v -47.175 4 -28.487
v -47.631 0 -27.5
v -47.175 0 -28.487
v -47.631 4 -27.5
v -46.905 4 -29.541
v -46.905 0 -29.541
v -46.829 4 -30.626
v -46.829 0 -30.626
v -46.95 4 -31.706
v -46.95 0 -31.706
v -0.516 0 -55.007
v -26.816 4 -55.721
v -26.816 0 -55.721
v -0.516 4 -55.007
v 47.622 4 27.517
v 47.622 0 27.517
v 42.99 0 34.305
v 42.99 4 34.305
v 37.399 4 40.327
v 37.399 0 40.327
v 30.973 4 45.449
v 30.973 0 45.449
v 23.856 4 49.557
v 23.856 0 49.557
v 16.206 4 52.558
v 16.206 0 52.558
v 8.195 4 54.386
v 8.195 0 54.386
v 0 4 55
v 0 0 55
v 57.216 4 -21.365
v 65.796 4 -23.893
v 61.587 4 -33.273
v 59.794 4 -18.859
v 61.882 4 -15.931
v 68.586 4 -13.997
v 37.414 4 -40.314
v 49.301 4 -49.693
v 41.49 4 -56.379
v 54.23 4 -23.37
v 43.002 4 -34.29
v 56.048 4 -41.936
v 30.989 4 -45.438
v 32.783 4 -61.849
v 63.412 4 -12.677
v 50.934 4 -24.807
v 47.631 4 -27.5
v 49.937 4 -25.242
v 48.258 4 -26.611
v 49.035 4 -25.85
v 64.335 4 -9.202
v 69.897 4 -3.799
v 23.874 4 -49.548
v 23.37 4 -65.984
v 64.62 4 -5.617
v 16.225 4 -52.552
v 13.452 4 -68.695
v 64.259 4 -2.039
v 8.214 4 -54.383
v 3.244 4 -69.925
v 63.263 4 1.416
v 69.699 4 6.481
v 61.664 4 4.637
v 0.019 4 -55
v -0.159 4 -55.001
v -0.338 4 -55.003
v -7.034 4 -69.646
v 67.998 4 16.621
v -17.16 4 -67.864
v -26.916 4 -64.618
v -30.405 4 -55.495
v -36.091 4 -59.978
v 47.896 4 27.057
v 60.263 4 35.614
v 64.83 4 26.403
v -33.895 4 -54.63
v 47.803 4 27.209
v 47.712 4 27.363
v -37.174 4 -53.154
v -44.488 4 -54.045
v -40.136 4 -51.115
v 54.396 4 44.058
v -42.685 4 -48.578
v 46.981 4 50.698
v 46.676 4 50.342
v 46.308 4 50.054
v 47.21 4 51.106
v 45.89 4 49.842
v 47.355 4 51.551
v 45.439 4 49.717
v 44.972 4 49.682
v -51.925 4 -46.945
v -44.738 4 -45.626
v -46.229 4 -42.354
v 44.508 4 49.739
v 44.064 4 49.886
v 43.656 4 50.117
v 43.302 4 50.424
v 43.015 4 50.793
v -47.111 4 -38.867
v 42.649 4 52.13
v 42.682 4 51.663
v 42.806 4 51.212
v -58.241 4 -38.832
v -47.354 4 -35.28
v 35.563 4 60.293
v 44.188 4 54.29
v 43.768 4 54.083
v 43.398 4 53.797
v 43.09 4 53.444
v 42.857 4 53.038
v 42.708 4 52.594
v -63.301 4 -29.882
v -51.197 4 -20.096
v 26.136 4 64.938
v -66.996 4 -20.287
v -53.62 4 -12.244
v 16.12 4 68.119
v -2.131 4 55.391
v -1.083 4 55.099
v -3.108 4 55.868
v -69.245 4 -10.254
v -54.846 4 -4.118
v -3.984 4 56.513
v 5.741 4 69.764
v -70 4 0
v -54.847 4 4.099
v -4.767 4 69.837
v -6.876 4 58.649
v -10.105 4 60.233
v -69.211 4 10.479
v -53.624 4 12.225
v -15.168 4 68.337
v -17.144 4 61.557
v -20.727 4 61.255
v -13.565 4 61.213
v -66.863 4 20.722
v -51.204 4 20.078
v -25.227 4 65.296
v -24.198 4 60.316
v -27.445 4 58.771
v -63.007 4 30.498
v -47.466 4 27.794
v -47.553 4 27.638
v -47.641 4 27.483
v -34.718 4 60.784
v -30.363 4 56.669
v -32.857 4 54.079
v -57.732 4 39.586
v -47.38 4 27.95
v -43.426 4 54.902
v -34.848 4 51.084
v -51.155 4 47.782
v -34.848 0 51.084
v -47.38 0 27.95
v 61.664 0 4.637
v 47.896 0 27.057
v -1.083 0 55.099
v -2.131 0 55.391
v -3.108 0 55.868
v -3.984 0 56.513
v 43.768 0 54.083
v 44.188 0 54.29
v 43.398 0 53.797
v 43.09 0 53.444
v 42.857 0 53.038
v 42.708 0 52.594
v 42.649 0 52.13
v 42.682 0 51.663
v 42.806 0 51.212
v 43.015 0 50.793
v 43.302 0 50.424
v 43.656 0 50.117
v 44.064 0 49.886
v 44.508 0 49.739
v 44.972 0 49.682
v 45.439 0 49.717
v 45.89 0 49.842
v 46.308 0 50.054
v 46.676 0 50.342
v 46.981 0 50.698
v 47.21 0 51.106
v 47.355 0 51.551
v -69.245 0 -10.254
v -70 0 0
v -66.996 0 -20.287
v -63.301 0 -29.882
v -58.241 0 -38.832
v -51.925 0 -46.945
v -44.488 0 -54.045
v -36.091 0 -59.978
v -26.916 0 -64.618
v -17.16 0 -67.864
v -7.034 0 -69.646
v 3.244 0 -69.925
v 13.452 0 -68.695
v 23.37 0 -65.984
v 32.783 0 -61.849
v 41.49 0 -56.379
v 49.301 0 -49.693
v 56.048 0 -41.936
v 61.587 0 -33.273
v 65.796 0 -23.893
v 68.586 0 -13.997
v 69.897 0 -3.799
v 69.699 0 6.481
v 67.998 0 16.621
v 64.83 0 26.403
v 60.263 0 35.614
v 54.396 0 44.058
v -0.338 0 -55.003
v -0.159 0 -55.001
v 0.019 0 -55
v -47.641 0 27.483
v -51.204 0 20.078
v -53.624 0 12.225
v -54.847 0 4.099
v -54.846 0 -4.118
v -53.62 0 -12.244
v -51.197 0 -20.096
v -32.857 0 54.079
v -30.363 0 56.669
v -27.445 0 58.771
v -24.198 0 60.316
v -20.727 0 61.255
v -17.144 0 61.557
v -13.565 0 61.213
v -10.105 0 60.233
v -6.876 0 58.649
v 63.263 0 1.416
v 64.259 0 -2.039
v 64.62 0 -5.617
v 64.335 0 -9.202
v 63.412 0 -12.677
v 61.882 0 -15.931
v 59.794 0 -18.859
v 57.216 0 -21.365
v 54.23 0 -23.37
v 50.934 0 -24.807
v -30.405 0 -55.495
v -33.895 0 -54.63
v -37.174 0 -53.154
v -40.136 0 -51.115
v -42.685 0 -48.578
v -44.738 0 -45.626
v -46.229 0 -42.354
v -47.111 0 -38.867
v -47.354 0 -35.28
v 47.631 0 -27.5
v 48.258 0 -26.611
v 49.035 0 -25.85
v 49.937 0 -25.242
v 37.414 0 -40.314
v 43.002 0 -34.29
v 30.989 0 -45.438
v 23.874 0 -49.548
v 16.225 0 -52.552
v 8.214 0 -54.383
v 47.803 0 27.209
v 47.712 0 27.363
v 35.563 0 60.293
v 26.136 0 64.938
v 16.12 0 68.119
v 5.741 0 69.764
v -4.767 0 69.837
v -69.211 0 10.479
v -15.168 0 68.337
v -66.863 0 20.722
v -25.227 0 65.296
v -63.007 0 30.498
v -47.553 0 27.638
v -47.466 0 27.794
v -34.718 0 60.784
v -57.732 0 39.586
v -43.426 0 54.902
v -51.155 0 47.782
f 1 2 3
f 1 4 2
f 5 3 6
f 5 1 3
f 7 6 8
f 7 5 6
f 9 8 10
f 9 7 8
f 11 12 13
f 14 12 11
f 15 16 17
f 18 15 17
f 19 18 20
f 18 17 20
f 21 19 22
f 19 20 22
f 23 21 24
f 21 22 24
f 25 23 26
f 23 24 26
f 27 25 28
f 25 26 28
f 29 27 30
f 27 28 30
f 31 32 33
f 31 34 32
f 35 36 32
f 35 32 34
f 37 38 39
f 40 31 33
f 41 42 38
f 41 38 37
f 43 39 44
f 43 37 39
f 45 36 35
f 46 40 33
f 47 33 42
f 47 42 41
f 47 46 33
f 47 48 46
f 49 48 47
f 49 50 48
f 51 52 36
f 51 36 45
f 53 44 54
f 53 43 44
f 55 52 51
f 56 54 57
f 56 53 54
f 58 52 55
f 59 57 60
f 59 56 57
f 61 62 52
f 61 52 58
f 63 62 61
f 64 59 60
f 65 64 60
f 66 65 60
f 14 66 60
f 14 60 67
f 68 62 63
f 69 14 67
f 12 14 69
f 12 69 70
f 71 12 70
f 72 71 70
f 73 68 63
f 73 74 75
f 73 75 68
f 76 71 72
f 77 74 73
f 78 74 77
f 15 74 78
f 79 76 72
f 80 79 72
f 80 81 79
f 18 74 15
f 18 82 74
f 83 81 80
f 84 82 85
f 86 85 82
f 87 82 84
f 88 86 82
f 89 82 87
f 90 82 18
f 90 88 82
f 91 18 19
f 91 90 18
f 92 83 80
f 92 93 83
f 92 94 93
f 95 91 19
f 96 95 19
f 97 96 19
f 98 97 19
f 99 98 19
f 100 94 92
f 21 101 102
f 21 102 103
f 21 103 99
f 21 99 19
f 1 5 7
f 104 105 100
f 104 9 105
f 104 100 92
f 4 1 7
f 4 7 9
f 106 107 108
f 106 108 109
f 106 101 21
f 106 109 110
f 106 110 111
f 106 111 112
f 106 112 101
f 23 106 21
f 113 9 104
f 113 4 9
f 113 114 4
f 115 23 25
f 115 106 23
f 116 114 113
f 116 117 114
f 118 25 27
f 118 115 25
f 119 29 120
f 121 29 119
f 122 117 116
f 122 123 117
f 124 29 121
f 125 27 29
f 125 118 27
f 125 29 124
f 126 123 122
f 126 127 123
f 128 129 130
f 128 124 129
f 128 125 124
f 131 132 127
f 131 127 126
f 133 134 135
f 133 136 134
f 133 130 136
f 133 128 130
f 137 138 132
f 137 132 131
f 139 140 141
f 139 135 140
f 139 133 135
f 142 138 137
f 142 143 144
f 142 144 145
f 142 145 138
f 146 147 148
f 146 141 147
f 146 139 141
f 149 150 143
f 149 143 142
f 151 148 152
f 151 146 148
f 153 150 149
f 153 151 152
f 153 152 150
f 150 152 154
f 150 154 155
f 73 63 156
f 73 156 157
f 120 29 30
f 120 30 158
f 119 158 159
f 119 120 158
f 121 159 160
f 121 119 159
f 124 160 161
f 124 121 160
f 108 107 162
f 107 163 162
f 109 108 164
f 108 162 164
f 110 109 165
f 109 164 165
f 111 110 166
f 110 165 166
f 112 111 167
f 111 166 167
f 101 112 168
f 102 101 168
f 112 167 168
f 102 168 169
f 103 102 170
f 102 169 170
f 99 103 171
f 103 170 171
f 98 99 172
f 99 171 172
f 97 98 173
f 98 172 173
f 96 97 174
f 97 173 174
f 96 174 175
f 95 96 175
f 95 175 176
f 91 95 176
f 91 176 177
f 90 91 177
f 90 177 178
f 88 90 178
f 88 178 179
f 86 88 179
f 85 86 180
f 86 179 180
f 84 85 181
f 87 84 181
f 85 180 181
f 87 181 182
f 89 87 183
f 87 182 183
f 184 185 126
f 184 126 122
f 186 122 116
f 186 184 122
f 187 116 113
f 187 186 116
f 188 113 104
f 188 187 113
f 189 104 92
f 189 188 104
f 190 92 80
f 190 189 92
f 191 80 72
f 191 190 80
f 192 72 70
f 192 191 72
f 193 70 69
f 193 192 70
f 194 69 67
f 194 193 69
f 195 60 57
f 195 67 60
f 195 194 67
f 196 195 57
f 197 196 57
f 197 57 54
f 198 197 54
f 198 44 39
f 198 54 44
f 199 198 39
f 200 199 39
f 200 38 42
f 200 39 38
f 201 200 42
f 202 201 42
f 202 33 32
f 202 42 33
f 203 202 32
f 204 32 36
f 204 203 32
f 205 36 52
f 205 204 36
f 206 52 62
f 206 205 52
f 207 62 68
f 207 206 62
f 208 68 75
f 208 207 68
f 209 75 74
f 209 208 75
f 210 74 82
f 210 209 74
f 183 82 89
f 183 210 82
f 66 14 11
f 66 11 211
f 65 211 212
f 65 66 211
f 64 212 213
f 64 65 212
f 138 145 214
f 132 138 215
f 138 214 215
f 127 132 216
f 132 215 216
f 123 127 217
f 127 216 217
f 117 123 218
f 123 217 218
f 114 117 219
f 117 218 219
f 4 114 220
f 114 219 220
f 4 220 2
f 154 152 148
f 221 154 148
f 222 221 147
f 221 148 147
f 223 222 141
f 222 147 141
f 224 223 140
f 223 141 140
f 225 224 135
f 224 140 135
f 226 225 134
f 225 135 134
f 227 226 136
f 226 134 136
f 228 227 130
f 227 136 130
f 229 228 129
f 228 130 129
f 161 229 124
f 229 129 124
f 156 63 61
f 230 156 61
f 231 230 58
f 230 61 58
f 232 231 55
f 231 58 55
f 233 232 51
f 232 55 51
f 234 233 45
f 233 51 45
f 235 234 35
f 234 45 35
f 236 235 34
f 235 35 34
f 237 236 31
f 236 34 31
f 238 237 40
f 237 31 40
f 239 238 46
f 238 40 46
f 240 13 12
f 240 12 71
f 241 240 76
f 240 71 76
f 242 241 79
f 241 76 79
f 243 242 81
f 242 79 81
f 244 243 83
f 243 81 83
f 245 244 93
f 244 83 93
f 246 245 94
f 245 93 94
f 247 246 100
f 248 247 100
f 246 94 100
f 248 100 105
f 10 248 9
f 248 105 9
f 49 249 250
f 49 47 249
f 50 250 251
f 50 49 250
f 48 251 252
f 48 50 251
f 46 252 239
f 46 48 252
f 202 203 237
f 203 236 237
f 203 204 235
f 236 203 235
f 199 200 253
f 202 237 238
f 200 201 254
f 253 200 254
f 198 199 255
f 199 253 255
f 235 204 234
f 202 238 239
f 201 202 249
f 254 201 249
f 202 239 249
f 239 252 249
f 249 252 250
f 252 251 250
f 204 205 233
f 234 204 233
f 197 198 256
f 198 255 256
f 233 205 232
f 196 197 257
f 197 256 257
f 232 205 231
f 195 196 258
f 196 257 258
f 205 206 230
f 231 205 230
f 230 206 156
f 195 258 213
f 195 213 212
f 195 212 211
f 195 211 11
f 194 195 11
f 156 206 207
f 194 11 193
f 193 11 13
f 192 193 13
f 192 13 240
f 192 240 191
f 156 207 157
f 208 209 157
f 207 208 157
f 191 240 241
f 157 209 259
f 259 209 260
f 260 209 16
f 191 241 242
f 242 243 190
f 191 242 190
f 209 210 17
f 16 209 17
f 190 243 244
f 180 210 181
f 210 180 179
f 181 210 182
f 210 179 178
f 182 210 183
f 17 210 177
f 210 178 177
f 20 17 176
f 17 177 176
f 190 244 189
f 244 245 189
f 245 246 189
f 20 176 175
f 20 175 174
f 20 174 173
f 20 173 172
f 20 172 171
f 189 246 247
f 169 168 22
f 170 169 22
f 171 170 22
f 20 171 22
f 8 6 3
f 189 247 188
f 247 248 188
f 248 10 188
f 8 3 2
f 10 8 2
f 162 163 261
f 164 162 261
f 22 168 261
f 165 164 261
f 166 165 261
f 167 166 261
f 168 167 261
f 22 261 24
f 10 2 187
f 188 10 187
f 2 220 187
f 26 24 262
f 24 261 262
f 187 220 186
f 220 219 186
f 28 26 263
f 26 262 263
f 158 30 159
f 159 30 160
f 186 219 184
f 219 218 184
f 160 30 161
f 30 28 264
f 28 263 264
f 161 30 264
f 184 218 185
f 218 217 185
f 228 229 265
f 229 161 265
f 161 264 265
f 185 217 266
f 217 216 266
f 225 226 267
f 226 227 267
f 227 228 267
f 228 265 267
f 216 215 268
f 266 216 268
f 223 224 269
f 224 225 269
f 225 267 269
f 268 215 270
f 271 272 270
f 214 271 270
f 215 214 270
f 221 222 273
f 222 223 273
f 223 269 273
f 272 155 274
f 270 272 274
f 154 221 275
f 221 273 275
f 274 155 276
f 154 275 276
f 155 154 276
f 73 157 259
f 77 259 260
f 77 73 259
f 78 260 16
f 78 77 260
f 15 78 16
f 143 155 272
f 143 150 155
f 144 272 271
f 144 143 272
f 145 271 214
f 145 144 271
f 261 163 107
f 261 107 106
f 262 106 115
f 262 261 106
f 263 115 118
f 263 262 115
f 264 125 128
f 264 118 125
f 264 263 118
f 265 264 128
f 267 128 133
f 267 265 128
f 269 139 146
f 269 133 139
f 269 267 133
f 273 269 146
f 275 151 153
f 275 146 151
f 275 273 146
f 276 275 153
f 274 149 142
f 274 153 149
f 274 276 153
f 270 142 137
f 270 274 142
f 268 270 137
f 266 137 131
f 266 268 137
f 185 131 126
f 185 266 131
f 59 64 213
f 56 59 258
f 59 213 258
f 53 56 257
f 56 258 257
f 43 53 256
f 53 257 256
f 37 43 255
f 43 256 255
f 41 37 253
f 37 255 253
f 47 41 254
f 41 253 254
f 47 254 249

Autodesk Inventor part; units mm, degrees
ref_plane "YZ Plane" through (0, 0, 0) normal (1, 0, 0) x (0, 1, 0)
ref_plane "XZ Plane" through (0, 0, 0) normal (0, 1, 0) x (-1, 0, 0)
ref_plane "XY Plane" through (0, 0, 0) normal (0, 0, 1) x (1, 0, 0)
sketch "Sketch2" plane through (0, 0, 0) normal (0, 1, 0) x (-1, 0, 0)
  circle A0 centre (0, 0) radius 55
  circle A1 centre (0, 0) radius 70
  dimension "d18" = 110
  dimension "d19" = 140
extrude "Extrusion3" add sketch "Sketch2" along normal blind 4
sketch "Sketch3" plane through (0, 4, 0) normal (0, 1, 0) x (1, 0, 0)
  circle A0 centre (0, 0) radius 55 projected
  circle A1 centre (0, 0) radius 70 projected
  arc A2 (0, -55) -> (-3.9836, -56.5132) centre (0, -61) ccw
  line L0 (0, -70) -> (0, 0) construction
  line L1 (0, 0) -> (-47.6314, -27.5) construction
  circle A3 centre (0, 0) radius 65 construction
  arc A4 (-34.8476, -51.084) -> (-3.9836, -56.5132) centre (-17.2622, -41.5574) ccw
  line L2 (-34.8476, -51.084) -> (-47.3798, -27.9505)
  arc A5 (-47.3798, -27.9505) -> (-47.6411, -27.4832) centre (-64.9651, -37.4771) ccw
  dimension "d24" = 60
  dimension "d31" = 6
  dimension "d33" = 20
  dimension "d34" = 130
extrude "Extrusion4" cut sketch "Sketch3" against normal blind 6 contours A0 A2 A4 L2 A5
pattern_circular "Circular Pattern2" count 3 over 360 about axis through (0, 0, 0) along (0, 1, 0) of "Extrusion4"
sketch "Sketch4" plane through (0, 0, 0) normal (0, -1, 0) x (1, 0, 0)
  circle A0 centre (45.0297, 52.0628) radius 2.3813 projected
  circle A1 centre (45.0297, 52.0628) radius 2.3813
extrude "Extrusion5" cut sketch "Sketch4" against normal blind 5.25
properties part number "launcher.cam"
